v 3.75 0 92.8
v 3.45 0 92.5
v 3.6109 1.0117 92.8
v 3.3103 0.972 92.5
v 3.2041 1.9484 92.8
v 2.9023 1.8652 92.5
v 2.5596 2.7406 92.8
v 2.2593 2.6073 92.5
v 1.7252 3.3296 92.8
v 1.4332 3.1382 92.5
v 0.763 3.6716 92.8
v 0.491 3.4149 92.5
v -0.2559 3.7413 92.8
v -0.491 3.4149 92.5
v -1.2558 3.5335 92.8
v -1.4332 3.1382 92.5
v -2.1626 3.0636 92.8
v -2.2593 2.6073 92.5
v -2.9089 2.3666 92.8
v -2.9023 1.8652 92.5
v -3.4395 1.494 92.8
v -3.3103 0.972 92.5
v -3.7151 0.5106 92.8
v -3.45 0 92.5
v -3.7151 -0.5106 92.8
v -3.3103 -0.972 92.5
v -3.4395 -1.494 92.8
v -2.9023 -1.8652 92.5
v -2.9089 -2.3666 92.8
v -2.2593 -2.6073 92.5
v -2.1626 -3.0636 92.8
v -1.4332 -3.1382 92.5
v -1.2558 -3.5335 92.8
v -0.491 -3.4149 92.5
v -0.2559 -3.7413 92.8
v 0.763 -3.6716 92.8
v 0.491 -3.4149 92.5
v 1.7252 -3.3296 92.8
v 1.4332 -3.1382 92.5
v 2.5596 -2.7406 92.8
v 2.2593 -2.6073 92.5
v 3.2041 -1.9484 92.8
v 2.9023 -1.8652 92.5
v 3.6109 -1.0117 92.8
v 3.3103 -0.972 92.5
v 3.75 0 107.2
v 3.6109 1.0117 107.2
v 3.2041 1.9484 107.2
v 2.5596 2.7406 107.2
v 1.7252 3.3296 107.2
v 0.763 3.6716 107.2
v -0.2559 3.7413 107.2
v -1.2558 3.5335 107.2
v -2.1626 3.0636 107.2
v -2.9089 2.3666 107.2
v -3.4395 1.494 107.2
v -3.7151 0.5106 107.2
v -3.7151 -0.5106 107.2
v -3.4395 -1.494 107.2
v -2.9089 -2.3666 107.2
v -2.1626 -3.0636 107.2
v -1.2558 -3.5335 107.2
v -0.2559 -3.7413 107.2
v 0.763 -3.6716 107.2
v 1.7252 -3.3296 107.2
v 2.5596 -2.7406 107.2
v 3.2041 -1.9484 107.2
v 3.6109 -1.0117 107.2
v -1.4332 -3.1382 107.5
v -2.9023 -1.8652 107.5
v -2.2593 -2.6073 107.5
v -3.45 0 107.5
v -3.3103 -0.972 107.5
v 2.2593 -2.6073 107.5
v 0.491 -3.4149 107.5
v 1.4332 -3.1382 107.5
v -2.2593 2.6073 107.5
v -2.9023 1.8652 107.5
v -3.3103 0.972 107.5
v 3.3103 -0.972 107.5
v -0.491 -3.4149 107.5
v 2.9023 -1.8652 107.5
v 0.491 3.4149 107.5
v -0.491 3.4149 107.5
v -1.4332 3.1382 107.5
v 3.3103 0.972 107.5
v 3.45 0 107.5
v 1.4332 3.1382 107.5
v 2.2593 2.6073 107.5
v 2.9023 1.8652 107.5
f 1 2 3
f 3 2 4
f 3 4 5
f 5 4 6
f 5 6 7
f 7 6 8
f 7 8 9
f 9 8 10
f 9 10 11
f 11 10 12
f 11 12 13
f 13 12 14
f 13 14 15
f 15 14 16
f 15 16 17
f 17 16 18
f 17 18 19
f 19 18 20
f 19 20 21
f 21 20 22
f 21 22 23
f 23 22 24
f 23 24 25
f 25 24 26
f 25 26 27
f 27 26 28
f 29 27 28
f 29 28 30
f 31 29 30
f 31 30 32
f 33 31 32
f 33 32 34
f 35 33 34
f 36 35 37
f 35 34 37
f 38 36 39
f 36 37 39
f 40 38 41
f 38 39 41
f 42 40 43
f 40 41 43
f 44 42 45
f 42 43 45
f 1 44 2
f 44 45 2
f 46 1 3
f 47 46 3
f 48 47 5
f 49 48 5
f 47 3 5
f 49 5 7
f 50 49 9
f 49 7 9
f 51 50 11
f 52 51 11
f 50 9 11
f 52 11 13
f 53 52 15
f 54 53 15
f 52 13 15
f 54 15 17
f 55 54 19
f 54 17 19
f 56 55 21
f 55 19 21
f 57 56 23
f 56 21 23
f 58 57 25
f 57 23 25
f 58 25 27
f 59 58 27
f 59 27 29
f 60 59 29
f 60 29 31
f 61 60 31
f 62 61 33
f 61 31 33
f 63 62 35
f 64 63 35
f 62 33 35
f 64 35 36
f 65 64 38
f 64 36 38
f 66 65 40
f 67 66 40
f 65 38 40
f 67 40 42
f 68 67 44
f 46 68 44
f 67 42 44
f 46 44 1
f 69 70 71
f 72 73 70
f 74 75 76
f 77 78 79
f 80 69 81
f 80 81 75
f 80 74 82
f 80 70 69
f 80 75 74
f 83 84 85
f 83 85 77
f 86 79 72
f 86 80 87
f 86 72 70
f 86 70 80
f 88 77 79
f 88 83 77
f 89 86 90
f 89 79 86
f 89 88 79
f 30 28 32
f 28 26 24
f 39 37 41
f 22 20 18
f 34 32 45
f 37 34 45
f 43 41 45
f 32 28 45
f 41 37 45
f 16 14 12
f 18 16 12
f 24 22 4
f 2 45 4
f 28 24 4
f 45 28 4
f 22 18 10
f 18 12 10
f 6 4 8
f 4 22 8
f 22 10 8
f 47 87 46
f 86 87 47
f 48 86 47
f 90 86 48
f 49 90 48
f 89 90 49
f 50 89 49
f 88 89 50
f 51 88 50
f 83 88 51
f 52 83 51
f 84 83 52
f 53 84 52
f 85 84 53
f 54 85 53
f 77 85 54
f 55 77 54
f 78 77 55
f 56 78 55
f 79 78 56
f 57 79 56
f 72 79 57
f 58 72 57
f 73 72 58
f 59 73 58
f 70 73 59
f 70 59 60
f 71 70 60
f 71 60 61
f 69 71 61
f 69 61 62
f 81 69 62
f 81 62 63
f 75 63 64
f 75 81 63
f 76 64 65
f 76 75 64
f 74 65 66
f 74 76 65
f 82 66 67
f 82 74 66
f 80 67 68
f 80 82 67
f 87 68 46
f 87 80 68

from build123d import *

# Parameters (mm, degrees)
SKETCH1_R           = 50
BOSS_EXTRUDE1_DEPTH = 200
CHAMFER1_SIZE       = 4
ECHELLE1_SCALE      = 0.075


with BuildPart() as part:
    # Sketch1 → Boss-Extrude1 (new body)
    with BuildSketch(Plane.XY):
        Circle(SKETCH1_R)
    extrude(amount=BOSS_EXTRUDE1_DEPTH)

    # Chamfer1
    chamfer1_edges = [part.edges().sort_by_distance(p)[0] for p in [
        (-50, 0, 0),
        (-50, 0, 200),
    ]]
    chamfer(chamfer1_edges, length=CHAMFER1_SIZE)


with BuildPart() as part_1:
    # Echelle1: scaled about (0, 0, 100)
    add(part.part.scale(ECHELLE1_SCALE).moved(Location((0, 0, 92.5))))


solid = part_1.part
